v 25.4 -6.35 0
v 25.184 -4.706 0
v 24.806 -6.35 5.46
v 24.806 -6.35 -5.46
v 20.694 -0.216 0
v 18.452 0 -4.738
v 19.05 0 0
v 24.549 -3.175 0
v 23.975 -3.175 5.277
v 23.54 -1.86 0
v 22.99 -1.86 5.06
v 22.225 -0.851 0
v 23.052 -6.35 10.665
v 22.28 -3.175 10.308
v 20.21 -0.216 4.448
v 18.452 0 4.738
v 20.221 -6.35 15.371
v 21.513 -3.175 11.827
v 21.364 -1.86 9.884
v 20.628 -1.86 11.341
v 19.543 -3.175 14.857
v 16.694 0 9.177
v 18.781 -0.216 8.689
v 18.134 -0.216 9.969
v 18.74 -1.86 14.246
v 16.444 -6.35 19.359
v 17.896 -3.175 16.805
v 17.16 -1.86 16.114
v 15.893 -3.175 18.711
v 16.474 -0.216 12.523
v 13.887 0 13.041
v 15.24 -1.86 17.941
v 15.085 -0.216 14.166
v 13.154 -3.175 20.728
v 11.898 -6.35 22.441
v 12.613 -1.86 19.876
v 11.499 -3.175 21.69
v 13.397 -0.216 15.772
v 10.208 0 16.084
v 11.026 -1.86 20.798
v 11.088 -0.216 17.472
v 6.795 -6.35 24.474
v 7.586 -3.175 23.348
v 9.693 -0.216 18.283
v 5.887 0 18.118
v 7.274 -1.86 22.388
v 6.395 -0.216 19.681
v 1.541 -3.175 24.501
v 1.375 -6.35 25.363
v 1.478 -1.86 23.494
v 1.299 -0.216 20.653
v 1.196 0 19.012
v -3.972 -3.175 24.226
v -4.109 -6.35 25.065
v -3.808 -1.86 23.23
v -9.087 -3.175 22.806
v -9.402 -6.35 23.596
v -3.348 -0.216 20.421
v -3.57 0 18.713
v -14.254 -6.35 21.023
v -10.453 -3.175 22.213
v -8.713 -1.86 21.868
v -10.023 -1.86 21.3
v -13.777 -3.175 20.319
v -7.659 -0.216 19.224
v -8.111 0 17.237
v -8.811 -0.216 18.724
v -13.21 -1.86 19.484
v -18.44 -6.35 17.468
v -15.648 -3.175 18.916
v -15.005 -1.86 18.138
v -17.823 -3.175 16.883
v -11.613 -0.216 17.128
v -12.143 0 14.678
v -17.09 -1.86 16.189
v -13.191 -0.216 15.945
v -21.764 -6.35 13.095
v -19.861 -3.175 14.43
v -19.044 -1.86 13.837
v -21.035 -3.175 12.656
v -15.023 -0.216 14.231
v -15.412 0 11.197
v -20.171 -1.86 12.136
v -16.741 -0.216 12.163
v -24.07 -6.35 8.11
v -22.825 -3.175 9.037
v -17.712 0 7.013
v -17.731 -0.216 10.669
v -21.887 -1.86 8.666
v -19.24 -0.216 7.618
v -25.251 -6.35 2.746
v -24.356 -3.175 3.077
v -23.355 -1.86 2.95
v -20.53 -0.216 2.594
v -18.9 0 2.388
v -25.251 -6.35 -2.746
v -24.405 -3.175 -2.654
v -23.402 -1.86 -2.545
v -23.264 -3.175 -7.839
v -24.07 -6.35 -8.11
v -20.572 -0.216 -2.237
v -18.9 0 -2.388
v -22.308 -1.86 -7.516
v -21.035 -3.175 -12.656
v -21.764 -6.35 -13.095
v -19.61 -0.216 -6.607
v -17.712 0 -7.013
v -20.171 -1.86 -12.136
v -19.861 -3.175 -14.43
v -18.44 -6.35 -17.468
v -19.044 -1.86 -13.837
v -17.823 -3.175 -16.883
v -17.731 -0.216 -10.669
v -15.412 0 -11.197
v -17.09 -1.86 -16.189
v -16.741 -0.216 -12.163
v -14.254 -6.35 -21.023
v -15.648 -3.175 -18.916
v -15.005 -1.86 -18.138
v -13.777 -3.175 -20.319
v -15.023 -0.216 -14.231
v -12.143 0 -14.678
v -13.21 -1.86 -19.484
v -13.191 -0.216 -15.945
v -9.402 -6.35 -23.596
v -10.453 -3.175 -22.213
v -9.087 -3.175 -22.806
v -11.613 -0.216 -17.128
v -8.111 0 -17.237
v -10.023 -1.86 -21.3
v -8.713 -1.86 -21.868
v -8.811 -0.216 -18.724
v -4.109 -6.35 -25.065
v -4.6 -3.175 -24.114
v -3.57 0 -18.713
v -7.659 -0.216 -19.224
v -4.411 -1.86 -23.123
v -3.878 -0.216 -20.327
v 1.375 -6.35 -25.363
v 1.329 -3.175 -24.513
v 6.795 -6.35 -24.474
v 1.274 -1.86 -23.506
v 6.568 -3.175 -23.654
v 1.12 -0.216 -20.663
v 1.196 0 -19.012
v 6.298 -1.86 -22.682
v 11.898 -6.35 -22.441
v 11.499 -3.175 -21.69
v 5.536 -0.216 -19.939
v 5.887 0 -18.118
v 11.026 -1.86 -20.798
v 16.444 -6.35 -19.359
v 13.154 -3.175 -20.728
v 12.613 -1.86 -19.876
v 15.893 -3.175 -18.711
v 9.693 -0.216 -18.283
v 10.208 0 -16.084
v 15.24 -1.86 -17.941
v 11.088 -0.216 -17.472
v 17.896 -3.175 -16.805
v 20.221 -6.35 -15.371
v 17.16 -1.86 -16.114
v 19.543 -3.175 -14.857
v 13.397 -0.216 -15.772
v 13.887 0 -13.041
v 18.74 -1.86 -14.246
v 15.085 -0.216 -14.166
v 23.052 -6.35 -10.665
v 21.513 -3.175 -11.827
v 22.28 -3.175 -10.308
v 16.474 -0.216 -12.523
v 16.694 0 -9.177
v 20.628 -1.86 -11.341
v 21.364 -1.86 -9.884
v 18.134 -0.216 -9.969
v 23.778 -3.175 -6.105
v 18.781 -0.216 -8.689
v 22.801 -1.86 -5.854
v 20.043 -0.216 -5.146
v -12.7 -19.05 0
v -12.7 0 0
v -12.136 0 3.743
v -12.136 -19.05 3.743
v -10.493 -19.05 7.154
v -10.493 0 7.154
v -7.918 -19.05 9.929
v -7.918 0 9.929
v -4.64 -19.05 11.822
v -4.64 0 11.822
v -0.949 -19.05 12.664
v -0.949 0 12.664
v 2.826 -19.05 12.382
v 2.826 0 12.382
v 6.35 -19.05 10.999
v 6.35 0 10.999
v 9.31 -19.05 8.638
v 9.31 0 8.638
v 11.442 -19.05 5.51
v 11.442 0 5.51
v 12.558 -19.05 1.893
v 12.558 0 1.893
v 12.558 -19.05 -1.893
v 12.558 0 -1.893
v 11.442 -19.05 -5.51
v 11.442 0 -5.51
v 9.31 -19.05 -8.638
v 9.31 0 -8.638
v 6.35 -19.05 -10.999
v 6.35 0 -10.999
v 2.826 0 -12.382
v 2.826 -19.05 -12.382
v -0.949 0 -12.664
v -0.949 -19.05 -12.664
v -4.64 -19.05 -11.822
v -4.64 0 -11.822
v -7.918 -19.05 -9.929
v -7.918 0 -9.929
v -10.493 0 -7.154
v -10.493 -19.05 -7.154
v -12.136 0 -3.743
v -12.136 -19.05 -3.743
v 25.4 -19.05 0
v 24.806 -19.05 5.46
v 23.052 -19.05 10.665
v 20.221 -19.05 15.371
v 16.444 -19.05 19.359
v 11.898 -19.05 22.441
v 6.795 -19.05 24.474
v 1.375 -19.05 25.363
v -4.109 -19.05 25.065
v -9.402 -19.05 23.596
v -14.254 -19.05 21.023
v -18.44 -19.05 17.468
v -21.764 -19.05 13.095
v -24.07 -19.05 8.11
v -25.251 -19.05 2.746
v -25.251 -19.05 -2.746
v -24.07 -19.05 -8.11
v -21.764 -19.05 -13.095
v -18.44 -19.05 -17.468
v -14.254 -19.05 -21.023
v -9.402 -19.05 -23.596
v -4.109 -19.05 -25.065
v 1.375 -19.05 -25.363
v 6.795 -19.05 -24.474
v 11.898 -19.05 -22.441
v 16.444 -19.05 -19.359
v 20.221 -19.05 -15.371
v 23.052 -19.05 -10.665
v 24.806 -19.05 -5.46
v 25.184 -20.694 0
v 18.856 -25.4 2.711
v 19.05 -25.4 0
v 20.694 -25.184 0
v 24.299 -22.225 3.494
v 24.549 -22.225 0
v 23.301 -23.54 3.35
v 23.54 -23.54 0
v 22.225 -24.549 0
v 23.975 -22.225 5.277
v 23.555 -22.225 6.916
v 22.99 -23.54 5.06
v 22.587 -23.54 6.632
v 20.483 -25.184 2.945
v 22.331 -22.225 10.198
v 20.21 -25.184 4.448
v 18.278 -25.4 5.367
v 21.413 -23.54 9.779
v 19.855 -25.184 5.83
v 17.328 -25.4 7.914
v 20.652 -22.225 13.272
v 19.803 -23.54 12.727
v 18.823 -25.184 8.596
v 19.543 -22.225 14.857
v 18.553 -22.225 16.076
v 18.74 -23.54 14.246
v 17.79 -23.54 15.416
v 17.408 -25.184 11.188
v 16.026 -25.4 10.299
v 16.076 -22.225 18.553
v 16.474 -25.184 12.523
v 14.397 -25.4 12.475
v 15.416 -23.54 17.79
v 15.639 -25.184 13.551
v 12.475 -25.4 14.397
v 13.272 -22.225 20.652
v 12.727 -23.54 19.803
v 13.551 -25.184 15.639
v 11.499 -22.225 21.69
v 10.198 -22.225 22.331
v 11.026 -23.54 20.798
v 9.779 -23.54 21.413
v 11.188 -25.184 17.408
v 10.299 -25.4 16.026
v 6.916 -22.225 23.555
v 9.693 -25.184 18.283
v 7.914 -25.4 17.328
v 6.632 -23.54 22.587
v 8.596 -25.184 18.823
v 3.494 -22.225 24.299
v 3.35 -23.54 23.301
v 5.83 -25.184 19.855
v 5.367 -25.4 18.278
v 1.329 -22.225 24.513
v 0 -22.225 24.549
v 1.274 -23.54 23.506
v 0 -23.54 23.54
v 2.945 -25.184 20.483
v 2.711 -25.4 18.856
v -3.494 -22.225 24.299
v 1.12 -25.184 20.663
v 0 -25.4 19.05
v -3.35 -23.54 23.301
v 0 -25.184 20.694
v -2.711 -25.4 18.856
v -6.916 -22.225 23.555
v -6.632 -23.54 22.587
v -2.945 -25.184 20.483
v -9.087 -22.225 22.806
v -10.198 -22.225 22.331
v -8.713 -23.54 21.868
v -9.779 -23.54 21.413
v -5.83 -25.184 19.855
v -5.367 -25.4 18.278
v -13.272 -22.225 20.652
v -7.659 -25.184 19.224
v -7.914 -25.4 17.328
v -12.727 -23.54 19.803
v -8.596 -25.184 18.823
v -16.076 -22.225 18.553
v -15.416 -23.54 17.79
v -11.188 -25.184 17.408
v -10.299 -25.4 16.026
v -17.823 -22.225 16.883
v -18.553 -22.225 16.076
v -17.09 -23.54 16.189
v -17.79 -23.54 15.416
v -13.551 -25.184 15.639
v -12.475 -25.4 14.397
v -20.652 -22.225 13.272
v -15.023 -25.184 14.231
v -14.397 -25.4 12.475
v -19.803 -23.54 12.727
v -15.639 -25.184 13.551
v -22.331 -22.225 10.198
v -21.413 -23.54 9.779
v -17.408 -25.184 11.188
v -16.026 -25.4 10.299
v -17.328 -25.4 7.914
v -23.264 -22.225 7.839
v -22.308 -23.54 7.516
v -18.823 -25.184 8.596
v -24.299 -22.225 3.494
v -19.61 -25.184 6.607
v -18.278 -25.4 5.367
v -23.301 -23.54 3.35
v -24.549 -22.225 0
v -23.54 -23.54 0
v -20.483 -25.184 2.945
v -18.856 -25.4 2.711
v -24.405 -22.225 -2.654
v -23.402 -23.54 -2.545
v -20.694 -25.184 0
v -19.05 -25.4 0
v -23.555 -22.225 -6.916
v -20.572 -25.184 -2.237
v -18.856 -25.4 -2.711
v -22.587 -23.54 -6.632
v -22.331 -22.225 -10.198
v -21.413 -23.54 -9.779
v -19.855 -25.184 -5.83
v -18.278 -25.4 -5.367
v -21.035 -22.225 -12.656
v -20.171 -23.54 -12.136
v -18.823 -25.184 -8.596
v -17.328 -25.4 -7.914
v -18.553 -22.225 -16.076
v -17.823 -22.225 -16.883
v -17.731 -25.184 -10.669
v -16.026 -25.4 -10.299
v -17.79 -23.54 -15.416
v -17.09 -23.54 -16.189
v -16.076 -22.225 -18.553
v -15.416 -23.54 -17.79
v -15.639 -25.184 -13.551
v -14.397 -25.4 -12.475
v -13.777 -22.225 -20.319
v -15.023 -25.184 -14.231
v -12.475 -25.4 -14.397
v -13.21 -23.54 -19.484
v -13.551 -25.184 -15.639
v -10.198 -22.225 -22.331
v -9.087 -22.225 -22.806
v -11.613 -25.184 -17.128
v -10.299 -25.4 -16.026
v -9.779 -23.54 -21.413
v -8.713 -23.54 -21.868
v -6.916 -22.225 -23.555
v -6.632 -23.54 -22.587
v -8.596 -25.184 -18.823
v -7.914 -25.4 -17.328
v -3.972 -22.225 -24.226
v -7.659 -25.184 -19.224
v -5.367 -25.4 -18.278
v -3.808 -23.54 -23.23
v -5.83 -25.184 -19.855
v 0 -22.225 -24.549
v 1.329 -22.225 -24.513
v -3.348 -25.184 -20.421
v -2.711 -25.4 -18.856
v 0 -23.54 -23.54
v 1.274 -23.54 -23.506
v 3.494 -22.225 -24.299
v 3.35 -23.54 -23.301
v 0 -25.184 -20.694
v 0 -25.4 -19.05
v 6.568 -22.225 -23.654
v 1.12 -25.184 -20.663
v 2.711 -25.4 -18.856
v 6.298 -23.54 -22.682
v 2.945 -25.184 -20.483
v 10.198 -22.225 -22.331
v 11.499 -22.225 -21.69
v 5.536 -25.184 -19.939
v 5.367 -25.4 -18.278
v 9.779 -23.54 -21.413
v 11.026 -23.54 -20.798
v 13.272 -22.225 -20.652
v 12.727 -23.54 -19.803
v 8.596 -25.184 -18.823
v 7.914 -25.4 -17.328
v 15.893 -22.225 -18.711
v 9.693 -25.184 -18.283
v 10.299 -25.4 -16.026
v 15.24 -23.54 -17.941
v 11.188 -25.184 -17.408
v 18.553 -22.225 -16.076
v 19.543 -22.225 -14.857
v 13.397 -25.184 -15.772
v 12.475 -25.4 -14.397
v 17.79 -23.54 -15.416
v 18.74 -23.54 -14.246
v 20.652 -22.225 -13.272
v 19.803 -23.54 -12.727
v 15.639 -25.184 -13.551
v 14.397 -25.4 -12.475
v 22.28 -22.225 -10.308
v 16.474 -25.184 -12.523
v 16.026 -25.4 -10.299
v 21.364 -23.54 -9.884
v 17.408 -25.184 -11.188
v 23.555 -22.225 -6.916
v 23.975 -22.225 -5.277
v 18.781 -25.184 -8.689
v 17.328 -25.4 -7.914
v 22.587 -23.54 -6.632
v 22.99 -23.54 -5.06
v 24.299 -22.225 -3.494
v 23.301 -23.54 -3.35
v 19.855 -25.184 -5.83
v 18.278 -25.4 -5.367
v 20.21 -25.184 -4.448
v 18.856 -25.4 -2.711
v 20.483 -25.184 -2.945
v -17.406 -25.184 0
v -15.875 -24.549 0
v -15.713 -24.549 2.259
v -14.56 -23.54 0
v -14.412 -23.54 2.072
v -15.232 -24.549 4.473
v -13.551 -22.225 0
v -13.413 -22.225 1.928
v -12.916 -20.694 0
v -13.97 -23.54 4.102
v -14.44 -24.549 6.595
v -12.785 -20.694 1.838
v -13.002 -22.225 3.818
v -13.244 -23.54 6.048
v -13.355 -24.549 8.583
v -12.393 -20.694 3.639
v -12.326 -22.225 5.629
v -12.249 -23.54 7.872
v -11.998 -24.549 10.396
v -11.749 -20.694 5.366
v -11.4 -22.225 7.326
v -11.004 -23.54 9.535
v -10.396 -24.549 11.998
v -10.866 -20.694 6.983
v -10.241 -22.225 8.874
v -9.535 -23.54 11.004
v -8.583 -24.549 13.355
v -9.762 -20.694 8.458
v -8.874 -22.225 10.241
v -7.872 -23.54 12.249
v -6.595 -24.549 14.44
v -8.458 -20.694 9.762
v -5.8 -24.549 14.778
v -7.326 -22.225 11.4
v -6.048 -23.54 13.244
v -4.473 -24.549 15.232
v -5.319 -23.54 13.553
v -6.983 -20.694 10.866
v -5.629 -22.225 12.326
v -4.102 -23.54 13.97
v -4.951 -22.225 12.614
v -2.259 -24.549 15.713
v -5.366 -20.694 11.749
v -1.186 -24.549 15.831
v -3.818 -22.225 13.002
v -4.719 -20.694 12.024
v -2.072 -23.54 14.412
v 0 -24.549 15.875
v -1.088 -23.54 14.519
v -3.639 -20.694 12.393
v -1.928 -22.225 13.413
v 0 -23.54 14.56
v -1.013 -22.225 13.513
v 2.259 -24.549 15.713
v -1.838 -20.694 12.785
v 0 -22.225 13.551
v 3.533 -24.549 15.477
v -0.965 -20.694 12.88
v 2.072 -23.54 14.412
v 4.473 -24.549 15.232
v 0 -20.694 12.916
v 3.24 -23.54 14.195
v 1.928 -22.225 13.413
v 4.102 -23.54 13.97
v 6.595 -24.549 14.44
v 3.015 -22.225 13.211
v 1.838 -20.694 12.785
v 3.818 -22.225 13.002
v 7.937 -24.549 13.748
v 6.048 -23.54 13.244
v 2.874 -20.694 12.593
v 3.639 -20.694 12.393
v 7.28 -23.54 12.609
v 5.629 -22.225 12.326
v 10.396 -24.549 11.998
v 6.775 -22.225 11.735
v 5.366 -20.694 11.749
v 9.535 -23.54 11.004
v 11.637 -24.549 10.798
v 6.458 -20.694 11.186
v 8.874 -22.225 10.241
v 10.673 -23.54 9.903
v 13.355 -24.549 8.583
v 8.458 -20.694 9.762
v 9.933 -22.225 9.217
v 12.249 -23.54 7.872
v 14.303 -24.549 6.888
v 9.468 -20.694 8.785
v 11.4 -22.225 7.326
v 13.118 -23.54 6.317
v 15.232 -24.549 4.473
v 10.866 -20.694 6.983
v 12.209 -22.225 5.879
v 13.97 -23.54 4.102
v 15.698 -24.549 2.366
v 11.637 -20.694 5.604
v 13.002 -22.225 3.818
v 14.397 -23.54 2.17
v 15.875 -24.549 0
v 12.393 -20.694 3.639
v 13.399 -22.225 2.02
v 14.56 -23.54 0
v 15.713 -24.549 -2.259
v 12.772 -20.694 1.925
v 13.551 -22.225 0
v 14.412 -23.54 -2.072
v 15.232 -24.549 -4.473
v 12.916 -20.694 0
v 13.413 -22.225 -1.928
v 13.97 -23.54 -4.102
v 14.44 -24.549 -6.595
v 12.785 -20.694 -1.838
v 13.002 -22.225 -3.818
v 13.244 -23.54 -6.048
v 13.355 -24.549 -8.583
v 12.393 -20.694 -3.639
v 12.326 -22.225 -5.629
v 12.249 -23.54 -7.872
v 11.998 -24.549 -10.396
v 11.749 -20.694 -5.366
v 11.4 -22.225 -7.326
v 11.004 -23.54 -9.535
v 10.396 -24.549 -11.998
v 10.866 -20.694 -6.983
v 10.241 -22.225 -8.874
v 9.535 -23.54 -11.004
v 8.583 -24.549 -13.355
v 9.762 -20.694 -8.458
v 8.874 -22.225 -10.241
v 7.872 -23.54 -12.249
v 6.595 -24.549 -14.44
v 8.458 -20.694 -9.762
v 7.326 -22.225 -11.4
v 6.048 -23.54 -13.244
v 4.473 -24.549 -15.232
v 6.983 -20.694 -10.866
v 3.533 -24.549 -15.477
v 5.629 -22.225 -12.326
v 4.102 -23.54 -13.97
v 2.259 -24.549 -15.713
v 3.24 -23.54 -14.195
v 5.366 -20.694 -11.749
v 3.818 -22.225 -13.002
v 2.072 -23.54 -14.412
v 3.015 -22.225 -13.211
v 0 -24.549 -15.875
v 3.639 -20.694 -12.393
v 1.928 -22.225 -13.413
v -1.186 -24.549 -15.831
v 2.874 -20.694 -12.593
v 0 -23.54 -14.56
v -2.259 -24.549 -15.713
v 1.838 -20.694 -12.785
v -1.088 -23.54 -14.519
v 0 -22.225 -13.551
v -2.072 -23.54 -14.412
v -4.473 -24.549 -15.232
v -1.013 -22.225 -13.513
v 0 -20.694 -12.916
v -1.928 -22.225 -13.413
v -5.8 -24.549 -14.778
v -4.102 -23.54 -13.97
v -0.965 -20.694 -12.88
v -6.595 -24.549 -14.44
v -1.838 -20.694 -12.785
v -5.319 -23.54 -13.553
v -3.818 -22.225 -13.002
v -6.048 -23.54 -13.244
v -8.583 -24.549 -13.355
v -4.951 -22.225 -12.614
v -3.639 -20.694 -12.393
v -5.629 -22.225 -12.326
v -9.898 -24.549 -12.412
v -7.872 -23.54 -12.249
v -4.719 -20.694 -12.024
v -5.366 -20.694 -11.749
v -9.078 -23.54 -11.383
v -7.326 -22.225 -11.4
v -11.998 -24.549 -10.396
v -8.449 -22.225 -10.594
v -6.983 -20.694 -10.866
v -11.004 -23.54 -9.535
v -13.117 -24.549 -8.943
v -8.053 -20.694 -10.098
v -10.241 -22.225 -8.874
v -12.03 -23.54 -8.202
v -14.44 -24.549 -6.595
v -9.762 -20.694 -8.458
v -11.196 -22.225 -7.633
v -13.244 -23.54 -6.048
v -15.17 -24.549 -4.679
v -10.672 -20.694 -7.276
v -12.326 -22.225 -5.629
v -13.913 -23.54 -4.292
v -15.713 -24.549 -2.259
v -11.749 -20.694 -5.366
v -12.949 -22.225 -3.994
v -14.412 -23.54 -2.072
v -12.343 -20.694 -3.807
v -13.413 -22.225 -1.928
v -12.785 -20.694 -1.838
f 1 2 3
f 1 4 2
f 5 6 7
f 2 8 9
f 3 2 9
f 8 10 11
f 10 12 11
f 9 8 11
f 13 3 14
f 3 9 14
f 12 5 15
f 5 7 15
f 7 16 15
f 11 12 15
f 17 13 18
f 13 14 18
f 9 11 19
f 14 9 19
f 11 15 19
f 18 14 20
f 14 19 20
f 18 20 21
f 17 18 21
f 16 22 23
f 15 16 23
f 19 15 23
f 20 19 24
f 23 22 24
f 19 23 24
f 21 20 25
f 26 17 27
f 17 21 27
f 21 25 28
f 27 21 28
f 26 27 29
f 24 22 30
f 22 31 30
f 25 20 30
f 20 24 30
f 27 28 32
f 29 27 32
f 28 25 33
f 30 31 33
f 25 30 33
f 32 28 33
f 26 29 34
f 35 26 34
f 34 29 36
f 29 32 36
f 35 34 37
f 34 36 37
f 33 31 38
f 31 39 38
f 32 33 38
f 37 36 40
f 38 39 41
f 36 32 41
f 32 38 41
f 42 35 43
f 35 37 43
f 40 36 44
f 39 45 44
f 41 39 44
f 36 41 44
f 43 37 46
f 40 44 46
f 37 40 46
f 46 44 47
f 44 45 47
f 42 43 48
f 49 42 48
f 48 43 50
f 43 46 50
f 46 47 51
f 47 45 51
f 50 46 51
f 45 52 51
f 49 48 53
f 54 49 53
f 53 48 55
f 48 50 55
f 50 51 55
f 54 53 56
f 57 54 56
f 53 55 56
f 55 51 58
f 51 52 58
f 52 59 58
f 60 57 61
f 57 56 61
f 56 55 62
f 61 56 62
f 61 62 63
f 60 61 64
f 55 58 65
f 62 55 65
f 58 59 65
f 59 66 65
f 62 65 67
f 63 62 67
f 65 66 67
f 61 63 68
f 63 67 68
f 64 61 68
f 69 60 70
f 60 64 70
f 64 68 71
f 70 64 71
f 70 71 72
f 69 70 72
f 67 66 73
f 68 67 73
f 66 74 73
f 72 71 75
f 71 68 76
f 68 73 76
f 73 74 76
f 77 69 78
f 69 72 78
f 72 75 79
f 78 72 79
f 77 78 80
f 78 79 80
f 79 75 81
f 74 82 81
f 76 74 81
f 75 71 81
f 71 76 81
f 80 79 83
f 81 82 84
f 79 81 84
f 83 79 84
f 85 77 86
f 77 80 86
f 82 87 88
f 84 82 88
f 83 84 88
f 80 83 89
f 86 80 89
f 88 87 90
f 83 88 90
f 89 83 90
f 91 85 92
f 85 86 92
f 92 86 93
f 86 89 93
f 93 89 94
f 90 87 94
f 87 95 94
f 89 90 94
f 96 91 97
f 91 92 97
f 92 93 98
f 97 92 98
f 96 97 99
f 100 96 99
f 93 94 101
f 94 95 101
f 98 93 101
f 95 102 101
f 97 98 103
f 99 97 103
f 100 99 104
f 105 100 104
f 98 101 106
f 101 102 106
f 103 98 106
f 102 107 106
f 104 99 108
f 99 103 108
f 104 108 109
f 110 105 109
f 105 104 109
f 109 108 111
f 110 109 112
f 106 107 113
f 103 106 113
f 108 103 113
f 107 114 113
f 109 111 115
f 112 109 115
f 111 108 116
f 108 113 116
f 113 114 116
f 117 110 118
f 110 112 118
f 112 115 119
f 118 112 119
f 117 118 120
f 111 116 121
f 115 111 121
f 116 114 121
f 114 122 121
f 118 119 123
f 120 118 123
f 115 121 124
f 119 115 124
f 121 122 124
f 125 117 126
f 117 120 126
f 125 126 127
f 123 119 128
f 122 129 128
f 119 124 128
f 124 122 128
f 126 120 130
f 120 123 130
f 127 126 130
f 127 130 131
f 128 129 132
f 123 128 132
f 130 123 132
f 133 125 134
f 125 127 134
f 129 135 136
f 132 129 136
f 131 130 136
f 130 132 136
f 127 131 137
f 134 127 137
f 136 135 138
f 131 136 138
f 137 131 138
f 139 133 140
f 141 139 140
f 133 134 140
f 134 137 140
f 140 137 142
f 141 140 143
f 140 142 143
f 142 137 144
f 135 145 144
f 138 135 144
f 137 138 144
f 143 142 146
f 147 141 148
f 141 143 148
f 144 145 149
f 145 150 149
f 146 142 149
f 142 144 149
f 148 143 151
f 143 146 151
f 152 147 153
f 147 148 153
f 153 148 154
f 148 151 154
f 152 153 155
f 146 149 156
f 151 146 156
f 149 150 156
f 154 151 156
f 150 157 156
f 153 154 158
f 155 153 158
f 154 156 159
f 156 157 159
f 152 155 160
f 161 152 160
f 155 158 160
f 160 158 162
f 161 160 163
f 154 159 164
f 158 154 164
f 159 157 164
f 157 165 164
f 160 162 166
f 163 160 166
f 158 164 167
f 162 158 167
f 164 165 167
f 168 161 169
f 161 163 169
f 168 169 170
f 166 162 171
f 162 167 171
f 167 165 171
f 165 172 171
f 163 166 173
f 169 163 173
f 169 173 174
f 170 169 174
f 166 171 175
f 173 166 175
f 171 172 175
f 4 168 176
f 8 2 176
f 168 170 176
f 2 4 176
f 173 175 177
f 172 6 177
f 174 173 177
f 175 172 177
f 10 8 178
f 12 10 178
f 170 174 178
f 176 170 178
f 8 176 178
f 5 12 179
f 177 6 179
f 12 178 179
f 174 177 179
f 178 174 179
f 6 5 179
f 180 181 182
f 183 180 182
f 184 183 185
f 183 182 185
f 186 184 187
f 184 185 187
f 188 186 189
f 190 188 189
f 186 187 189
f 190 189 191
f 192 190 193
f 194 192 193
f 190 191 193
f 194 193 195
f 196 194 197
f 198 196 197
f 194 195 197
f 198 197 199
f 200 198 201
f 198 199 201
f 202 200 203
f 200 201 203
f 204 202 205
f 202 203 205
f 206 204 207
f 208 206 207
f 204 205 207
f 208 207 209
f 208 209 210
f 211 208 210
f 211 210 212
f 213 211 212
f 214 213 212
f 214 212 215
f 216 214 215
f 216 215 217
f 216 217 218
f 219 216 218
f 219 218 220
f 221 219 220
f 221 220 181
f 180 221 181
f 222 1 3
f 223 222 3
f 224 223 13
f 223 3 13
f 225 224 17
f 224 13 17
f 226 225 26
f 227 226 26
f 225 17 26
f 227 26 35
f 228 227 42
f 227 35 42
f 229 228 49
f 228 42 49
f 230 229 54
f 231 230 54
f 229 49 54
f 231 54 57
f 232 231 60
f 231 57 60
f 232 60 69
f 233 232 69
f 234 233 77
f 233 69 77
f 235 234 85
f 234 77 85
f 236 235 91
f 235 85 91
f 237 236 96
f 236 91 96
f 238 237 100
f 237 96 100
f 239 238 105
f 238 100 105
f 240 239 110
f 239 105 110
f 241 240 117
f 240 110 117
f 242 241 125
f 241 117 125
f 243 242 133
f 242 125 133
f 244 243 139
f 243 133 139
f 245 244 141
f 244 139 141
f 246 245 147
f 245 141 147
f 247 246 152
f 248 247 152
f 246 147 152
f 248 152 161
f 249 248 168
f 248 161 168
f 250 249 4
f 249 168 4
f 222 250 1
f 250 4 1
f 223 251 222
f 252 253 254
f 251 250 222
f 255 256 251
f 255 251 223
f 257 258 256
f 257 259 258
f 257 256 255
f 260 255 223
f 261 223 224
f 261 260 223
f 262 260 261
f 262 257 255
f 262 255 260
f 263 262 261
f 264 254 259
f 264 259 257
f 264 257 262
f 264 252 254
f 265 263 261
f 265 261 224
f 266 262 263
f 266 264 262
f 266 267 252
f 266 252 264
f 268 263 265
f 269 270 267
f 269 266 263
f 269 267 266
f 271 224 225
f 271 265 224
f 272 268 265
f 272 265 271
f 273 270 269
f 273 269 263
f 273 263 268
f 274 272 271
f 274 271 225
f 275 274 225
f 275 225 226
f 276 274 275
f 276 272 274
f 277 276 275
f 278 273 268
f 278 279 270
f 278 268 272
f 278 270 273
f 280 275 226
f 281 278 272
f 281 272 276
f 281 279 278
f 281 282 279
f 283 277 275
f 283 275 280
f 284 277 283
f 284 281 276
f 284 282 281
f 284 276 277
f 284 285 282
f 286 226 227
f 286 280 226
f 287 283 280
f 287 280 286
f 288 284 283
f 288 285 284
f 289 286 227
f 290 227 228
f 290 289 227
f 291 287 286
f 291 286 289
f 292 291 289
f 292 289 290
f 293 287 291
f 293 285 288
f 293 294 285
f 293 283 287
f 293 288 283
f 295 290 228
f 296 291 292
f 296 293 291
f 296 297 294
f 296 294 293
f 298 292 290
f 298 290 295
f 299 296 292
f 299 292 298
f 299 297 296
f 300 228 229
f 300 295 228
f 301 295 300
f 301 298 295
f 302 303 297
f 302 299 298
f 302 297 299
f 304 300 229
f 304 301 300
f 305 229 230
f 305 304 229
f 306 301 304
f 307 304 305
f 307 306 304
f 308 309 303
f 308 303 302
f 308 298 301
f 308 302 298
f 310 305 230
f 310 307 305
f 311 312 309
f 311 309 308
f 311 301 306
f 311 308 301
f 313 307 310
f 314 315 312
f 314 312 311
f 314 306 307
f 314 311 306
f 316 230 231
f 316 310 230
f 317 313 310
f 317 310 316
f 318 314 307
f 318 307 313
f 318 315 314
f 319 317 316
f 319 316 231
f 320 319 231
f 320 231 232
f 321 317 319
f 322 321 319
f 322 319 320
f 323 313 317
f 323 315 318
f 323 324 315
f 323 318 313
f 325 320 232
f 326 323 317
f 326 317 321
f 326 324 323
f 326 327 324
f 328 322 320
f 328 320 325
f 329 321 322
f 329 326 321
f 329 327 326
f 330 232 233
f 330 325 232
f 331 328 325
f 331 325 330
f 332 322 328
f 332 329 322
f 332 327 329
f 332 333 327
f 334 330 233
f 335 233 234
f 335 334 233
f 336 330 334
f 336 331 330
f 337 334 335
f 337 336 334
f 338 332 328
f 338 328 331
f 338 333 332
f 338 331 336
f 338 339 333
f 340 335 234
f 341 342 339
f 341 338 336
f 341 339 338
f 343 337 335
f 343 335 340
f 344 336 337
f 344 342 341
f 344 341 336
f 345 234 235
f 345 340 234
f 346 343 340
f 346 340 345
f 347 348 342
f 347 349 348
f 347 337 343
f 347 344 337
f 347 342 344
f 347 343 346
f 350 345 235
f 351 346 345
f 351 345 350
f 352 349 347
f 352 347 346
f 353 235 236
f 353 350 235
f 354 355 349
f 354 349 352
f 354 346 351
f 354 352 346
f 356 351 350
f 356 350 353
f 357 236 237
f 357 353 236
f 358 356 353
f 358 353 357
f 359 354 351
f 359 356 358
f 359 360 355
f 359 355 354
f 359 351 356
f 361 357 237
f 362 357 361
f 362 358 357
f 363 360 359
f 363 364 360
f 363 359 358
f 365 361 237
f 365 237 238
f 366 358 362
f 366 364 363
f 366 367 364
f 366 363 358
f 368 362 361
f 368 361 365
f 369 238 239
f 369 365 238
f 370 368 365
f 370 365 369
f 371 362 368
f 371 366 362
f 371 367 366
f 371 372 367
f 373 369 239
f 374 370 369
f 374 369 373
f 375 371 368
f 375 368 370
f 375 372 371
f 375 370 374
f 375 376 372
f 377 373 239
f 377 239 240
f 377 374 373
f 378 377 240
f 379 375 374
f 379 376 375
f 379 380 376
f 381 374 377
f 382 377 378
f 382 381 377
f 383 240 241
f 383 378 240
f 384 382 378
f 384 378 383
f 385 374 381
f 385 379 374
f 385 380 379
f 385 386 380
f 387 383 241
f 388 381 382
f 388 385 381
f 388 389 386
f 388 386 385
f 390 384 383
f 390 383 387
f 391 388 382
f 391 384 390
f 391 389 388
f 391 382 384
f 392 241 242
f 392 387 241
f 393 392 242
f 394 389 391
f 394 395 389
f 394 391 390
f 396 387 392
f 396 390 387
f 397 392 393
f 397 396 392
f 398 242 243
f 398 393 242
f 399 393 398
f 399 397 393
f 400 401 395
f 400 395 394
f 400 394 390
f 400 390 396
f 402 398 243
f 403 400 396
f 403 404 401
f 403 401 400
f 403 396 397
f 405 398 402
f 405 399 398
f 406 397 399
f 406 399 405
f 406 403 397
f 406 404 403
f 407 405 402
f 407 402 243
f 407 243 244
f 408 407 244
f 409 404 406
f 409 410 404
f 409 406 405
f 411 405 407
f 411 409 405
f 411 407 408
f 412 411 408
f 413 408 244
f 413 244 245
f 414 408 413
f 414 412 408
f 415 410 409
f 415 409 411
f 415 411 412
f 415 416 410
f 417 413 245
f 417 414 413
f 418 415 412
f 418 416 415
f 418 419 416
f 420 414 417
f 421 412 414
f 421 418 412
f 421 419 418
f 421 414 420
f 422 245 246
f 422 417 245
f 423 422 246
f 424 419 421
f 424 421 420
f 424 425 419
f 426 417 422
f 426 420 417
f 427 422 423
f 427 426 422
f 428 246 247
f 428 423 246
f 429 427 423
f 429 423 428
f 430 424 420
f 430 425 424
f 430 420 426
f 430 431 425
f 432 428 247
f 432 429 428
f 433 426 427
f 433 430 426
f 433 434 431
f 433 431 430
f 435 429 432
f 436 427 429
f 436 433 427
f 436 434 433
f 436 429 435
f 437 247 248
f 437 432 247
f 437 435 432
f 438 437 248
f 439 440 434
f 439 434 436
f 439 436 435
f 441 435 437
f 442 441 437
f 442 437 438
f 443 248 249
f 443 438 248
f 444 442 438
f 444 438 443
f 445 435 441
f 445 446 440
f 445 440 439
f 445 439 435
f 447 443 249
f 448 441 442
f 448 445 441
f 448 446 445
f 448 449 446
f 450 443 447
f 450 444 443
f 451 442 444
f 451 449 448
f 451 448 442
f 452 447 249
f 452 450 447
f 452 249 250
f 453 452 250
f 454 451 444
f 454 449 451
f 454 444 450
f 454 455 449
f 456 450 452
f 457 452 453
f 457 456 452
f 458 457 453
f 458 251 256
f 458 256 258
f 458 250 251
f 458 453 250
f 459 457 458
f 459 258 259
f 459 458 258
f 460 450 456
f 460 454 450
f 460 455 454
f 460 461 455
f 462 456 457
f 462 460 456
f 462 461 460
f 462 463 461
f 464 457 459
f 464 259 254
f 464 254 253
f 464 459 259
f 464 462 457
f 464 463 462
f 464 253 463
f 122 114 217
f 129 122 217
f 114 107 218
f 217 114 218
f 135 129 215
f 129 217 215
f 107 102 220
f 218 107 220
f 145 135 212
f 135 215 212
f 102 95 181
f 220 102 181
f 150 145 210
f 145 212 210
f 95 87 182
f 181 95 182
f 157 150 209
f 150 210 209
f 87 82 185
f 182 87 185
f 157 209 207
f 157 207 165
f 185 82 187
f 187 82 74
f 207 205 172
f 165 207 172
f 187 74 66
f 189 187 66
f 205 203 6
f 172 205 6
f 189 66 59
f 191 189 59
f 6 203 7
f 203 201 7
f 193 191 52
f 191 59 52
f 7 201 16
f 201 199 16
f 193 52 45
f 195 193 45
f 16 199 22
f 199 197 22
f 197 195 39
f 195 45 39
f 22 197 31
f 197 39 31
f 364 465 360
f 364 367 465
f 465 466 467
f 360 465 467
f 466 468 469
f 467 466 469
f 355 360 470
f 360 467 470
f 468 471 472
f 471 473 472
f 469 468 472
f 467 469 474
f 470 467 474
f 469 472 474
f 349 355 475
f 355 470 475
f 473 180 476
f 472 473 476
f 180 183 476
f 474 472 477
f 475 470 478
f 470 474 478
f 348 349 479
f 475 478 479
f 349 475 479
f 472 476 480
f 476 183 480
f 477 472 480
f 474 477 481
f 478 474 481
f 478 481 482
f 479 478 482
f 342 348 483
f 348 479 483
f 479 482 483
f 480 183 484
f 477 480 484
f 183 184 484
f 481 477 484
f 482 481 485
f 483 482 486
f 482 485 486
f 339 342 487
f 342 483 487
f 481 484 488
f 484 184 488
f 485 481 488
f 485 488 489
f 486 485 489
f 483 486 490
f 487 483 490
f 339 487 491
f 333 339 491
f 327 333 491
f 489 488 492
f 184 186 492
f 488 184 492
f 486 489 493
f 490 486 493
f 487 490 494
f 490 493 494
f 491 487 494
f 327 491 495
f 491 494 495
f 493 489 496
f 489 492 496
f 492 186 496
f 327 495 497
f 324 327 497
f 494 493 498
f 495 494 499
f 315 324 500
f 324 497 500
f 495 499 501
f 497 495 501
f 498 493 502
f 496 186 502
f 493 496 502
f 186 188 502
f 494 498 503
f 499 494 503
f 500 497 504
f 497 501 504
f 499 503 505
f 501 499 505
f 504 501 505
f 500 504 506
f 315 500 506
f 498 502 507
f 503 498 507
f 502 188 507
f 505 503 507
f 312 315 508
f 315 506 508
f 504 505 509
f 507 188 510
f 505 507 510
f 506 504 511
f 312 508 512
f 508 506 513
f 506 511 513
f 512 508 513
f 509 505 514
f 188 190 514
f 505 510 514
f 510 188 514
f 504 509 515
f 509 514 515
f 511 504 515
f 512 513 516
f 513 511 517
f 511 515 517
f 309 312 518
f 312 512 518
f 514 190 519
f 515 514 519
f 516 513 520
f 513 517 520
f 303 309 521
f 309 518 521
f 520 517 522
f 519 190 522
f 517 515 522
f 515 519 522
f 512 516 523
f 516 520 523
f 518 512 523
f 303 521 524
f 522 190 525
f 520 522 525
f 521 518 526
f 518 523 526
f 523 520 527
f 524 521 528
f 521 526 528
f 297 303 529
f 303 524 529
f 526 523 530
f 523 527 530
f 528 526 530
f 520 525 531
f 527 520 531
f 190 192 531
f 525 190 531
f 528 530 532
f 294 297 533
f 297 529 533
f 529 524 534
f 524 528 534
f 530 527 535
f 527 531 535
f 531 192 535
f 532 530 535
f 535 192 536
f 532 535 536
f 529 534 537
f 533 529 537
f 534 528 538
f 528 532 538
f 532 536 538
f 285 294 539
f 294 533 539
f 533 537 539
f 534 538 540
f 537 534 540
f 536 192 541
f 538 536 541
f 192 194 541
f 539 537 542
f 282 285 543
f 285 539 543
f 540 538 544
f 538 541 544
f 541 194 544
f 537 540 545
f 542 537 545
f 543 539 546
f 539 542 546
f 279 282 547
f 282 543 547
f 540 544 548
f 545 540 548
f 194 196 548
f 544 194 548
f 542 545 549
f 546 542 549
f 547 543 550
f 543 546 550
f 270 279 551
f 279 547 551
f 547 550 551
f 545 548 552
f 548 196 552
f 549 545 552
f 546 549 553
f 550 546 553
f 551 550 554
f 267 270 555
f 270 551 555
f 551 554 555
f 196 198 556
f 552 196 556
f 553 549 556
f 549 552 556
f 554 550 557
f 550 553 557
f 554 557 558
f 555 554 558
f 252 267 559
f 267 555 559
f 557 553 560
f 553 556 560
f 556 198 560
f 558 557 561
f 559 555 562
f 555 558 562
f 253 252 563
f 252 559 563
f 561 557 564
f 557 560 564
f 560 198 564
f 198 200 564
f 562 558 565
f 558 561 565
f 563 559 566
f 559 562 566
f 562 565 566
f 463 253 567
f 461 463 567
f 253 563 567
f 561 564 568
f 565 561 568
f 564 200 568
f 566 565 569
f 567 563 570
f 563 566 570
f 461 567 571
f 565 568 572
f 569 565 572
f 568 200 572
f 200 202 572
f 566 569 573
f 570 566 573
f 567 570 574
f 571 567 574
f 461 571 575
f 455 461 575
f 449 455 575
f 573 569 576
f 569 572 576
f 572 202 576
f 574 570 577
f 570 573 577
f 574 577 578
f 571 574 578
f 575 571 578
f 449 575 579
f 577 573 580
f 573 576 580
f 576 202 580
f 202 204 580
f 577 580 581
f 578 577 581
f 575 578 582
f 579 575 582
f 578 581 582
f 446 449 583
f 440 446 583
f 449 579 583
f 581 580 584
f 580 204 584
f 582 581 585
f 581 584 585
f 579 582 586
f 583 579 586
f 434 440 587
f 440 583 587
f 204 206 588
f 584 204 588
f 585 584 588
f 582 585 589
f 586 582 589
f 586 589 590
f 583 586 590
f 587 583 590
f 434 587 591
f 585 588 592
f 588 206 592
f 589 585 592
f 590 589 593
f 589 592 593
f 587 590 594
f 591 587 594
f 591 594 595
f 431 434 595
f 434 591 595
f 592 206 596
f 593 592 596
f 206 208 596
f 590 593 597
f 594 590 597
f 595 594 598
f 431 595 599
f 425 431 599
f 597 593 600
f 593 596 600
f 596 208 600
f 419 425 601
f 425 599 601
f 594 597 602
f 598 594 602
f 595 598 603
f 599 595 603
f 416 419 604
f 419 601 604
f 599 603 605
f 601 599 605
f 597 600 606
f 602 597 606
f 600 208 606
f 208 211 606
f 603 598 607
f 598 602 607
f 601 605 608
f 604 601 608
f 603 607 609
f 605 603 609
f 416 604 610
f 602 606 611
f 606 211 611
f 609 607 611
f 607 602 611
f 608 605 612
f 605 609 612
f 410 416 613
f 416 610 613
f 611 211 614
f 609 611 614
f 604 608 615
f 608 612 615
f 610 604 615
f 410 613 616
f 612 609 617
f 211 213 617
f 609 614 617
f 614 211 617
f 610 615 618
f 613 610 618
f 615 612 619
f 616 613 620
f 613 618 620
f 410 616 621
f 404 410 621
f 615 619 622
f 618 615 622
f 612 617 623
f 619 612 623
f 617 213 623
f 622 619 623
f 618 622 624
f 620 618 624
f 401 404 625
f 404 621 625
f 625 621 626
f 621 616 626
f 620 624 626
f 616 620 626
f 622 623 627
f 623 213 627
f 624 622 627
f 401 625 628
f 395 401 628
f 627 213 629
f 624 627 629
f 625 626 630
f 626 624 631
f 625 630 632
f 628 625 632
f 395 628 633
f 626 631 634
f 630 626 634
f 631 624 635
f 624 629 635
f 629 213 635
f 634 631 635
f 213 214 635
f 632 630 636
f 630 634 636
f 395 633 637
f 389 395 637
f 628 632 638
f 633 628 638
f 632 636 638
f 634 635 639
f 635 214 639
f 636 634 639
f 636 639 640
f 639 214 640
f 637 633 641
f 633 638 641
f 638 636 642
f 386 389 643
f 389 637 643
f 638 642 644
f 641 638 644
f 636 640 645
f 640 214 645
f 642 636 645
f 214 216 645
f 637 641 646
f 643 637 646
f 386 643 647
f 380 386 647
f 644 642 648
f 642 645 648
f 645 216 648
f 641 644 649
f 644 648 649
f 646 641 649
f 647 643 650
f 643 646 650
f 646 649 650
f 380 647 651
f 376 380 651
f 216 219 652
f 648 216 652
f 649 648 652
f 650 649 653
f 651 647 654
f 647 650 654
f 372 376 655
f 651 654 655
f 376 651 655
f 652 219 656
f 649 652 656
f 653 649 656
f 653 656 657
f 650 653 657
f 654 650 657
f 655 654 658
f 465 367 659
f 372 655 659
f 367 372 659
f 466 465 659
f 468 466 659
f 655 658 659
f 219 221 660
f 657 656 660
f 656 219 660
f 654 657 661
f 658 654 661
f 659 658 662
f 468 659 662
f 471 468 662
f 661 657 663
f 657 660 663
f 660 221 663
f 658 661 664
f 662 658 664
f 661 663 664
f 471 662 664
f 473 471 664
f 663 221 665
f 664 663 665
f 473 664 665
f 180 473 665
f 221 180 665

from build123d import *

# Parameters (mm, degrees)
F3_R     = 25.4
F4_DEPTH = 25.4
F6_D     = 25.4
F7_R     = 6.34999
F8_R     = 6.35


# Not quite as in the source:
# - a fillet or chamfer is up to 0.001 mm smaller than in the source, because OpenCascade refuses the exact size
# - the program builds the solid bodies; features that only make, move or delete a surface that nothing else refers to are left out


with BuildPart() as f4:
    # F3 (on Front) → F4 (new body)
    with BuildSketch(Plane.XZ):
        Circle(F3_R)
    extrude(amount=F4_DEPTH)

    # F6 (through all)
    with Locations(Plane.XZ.offset(25.4)):
        with Locations((0, 0)):
            Hole(F6_D / 2)

    # F7 (radius 6.35 in the source; OpenCascade refuses exactly that, so slightly less here)
    f7_edges = [f4.edges().sort_by_distance(p)[0] for p in [
        (-25.4, -25.4, 0),
        (-12.7, -25.4, 0),
    ]]
    fillet(f7_edges, radius=F7_R)

    # F8
    f8_edges = [f4.edges().sort_by_distance(p)[0] for p in [
        (-25.4, 0, 0),
    ]]
    fillet(f8_edges, radius=F8_R)


solid = f4.part
